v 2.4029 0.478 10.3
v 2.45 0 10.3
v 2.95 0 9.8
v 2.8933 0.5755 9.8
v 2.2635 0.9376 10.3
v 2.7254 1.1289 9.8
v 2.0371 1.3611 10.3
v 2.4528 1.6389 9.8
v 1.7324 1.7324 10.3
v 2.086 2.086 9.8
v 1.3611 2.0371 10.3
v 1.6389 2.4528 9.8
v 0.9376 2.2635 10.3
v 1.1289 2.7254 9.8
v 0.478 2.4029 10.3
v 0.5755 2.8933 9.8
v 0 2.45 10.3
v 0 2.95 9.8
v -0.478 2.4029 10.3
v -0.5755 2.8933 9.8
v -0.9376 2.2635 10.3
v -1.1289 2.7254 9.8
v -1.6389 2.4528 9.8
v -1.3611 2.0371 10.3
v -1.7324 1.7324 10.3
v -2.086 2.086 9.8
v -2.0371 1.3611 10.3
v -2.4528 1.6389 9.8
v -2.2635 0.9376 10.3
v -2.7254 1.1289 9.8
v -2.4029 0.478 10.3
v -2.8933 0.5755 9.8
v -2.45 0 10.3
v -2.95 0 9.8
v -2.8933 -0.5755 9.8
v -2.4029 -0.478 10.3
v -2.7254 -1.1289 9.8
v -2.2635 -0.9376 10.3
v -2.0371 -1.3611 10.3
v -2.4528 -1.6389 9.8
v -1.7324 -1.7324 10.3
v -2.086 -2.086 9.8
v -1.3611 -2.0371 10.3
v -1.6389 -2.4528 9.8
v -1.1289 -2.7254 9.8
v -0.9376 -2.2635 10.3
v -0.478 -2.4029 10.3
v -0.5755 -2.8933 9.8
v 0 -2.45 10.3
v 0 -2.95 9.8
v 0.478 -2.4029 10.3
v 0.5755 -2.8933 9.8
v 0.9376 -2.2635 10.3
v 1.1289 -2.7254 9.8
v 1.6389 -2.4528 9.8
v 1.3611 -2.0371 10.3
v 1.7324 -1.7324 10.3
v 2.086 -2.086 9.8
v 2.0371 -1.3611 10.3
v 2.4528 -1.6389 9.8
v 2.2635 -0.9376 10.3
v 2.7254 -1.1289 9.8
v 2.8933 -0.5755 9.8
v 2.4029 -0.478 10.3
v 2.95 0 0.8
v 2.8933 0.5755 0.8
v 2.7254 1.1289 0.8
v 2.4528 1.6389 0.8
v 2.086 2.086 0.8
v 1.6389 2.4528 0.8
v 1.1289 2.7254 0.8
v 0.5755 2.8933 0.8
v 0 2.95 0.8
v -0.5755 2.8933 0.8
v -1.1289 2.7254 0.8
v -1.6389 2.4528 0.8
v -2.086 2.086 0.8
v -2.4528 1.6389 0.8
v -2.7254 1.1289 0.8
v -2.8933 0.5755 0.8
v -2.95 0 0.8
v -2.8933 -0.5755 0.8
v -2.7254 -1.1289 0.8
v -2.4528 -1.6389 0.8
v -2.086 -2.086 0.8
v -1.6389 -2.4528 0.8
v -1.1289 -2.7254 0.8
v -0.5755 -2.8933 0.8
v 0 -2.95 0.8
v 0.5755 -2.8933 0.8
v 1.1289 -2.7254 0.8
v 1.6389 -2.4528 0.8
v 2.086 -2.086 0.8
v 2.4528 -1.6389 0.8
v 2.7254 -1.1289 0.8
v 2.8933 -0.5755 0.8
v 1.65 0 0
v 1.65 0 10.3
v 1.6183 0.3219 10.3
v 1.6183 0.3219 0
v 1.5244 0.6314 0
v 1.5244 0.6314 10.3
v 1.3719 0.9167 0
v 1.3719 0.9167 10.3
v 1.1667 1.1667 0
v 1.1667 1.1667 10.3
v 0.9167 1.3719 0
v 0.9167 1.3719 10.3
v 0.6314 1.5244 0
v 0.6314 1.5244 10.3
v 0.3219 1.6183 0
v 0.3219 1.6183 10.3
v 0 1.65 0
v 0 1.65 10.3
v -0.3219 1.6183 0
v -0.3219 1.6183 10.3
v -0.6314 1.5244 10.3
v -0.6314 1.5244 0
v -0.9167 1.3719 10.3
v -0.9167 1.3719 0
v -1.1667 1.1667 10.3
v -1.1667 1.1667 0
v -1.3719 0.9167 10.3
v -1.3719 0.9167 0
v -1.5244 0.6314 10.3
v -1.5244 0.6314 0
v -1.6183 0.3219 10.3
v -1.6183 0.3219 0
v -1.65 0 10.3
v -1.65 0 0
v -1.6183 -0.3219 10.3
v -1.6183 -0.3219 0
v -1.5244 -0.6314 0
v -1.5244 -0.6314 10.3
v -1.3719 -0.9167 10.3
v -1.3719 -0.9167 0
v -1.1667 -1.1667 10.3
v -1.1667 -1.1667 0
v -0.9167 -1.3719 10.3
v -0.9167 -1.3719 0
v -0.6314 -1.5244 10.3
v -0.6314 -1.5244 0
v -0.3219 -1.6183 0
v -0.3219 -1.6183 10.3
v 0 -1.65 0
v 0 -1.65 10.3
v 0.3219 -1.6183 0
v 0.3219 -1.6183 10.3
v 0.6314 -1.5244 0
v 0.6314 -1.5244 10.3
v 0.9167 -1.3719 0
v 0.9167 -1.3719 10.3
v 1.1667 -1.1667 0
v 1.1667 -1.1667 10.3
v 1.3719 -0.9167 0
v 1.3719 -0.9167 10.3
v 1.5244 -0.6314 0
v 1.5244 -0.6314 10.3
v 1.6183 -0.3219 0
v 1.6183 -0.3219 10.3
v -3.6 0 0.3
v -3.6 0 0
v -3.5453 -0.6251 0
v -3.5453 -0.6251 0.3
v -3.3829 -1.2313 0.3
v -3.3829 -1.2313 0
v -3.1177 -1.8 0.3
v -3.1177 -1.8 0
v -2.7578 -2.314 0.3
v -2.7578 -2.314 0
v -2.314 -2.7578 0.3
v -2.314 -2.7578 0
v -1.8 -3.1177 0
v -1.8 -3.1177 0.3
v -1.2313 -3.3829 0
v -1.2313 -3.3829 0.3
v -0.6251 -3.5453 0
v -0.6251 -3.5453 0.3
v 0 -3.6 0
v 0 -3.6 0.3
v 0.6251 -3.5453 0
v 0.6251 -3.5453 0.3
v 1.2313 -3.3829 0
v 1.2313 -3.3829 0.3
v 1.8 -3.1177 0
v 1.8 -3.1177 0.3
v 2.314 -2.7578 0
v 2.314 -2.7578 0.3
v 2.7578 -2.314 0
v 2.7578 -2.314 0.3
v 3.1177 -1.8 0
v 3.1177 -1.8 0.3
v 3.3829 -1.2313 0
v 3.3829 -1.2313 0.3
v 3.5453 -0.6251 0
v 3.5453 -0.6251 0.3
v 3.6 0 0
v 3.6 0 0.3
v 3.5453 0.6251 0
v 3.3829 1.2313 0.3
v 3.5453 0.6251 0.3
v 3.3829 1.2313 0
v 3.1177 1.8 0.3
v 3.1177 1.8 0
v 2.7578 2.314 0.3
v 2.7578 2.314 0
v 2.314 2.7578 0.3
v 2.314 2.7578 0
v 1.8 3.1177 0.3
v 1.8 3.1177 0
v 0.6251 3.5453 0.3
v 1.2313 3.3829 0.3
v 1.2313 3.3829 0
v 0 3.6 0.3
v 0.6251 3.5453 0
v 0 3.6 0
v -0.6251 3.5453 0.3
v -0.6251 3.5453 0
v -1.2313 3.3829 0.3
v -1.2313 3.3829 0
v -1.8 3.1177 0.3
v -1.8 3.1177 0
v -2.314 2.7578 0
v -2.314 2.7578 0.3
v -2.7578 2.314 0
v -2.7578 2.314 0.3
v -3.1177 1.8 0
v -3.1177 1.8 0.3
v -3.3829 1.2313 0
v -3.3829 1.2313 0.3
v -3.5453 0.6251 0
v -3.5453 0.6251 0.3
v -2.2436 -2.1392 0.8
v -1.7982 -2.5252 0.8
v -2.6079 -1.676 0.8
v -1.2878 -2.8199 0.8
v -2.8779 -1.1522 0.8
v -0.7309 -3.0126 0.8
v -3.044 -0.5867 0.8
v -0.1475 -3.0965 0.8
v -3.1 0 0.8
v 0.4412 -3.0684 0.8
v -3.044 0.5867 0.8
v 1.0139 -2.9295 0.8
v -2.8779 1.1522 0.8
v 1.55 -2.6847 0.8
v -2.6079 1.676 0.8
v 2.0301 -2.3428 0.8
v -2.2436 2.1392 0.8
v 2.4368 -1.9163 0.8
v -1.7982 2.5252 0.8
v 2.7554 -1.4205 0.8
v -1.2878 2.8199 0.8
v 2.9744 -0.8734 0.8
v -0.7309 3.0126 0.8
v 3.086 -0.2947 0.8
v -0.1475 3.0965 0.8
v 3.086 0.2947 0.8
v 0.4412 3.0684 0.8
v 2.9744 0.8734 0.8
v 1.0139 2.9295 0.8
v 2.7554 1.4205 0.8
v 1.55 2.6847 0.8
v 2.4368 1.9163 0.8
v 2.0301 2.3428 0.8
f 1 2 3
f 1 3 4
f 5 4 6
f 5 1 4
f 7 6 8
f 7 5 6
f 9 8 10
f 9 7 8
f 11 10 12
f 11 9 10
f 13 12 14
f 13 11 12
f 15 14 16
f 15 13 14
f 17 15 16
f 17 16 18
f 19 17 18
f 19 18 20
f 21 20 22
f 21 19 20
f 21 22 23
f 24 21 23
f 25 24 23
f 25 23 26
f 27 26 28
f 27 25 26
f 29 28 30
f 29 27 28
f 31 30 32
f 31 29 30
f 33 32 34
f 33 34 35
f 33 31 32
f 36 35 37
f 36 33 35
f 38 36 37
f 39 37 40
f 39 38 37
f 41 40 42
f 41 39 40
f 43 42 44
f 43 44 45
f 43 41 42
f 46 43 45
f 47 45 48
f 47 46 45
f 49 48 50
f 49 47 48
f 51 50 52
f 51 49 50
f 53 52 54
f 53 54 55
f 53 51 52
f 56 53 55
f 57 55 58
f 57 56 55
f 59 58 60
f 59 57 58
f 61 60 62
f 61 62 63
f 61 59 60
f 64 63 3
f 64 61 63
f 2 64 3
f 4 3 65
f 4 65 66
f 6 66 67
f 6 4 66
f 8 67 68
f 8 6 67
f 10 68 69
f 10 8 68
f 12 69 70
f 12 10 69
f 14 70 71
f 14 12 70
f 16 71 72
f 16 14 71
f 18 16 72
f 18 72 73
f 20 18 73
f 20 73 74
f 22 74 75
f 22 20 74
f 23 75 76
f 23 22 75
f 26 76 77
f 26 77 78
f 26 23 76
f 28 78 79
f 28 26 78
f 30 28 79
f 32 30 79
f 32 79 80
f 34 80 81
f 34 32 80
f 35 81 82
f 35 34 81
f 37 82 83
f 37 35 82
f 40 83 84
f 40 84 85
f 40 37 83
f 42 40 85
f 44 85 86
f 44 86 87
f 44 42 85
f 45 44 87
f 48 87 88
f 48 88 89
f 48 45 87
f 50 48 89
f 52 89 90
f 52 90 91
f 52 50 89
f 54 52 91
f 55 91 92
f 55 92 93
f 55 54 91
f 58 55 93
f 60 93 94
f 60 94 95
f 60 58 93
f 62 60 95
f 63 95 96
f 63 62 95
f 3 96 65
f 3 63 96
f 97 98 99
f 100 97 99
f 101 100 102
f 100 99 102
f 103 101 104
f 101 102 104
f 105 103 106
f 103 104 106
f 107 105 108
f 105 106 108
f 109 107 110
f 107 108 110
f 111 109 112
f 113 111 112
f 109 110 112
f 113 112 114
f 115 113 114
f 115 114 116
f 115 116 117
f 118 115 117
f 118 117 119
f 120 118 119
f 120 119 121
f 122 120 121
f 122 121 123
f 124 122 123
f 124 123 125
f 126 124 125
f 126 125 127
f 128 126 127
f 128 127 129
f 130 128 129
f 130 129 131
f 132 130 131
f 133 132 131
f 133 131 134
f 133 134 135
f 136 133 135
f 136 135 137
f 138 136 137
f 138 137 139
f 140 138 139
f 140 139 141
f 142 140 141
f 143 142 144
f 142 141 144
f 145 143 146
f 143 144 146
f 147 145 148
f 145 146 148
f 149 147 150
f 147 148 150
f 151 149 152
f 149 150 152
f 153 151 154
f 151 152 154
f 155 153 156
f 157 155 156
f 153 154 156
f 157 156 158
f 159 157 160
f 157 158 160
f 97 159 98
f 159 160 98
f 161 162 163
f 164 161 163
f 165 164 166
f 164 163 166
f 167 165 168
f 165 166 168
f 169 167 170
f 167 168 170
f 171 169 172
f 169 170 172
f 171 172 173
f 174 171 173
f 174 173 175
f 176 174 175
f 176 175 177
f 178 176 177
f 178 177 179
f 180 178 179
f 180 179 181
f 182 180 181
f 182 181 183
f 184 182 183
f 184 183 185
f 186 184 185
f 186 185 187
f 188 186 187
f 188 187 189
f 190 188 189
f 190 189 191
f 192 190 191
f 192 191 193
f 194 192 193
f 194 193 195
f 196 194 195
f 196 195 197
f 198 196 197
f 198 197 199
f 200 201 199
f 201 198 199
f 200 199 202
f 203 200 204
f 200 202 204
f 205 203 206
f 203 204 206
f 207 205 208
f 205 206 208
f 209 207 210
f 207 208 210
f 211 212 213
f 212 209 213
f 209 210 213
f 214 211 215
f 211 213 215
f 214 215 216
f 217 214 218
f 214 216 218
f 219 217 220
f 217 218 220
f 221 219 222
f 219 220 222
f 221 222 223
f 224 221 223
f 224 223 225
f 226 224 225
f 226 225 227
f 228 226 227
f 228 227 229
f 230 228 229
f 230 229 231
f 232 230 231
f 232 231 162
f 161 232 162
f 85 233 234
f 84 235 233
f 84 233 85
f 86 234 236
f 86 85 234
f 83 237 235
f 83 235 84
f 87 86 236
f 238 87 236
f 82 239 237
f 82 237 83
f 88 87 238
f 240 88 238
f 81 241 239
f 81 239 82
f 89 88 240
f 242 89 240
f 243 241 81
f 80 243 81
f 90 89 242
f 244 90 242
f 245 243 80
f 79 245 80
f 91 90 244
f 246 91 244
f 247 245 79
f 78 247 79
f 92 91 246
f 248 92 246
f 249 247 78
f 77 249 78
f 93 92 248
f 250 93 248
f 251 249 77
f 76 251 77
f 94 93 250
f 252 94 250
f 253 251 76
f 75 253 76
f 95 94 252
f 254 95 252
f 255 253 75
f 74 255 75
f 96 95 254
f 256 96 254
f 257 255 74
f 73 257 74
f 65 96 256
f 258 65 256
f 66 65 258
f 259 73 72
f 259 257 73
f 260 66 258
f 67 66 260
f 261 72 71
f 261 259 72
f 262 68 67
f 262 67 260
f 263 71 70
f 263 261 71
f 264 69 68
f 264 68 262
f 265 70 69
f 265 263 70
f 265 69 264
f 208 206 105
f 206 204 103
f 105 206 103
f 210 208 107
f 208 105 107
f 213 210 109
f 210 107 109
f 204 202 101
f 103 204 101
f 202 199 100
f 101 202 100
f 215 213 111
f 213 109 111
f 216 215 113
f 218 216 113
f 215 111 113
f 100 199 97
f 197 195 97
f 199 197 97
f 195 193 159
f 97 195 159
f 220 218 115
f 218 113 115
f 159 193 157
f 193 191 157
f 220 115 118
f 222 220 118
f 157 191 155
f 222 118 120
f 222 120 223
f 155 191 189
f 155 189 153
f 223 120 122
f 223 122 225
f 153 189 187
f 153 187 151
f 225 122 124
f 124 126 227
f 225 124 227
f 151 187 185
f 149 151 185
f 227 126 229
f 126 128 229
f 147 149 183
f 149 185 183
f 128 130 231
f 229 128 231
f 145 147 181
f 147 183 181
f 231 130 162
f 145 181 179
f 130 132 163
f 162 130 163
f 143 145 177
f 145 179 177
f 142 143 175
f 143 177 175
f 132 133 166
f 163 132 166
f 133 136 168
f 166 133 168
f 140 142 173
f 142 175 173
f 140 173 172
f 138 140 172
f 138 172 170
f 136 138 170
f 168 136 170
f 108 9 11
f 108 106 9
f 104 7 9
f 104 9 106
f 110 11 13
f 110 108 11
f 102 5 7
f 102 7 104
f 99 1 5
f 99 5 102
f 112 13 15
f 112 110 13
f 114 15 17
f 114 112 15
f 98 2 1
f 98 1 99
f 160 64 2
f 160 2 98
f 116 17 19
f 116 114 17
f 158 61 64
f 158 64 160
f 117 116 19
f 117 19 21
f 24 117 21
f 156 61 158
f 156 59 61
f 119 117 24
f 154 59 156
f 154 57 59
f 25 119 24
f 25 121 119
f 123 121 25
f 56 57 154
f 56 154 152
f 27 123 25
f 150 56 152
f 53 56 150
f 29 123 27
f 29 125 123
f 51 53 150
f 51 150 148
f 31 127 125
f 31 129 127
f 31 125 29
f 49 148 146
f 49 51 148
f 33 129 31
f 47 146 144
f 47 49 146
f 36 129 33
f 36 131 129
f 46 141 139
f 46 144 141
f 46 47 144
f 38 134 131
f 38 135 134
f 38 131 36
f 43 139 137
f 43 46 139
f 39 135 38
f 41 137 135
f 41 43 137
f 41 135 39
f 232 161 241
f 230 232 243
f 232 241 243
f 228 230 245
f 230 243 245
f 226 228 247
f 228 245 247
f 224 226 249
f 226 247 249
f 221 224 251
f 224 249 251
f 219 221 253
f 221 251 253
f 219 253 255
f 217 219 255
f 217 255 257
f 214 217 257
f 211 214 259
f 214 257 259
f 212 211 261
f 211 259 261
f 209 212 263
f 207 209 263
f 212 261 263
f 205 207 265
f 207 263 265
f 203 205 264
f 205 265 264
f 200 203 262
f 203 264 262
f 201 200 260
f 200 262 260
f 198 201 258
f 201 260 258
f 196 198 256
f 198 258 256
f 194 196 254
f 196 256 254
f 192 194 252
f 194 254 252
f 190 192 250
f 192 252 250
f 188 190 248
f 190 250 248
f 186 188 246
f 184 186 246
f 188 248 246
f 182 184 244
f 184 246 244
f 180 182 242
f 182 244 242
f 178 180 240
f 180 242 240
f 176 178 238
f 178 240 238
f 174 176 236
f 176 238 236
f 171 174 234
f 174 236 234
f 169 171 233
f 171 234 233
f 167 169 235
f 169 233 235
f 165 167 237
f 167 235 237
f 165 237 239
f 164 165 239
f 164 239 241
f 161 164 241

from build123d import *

# Parameters (mm, degrees)
ESQUISSE1_R             = 3.6
BOSS_EXTRU_1_DEPTH      = 10.3
ESQUISSE2_OUTSIDE_W     = 12.096
ESQUISSE2_OUTSIDE_H     = 12.096
ESQUISSE2_OUTSIDE_R     = 2.95
ENL_V_MAT_EXTRU_1_DEPTH = 9.5
TROU_TARAUD_M41_D       = 3.3
CHANFREIN1_SIZE         = 0.5


with BuildPart() as part:
    # Esquisse1 → Boss.-Extru.1 (new body)
    with BuildSketch(Plane.XY):
        with Locations(Location((0, 0, 0), (0, 0, 180))):
            Circle(ESQUISSE1_R)
    extrude(amount=BOSS_EXTRU_1_DEPTH)

    # Esquisse2 outside → Enlèv. mat.-Extru.1 (cut)
    with BuildSketch(Plane.XY.offset(10.3)):
        Rectangle(ESQUISSE2_OUTSIDE_W, ESQUISSE2_OUTSIDE_H)
        Circle(ESQUISSE2_OUTSIDE_R, mode=Mode.SUBTRACT)
    extrude(amount=-ENL_V_MAT_EXTRU_1_DEPTH, mode=Mode.SUBTRACT)

    # Trou taraudé M41 (through all)
    with Locations(Plane(origin=(0, 0, 0), x_dir=(-1, 0, 0), z_dir=(0, 0, -1))):
        with Locations((0, 0)):
            Hole(TROU_TARAUD_M41_D / 2)

    # Chanfrein1
    chanfrein1_edges = [part.edges().sort_by_distance(p)[0] for p in [
        (-2.95, 0, 10.3),
        (3.6, 0, 0.8),
    ]]
    chamfer(chanfrein1_edges, length=CHANFREIN1_SIZE)


solid = part.part
